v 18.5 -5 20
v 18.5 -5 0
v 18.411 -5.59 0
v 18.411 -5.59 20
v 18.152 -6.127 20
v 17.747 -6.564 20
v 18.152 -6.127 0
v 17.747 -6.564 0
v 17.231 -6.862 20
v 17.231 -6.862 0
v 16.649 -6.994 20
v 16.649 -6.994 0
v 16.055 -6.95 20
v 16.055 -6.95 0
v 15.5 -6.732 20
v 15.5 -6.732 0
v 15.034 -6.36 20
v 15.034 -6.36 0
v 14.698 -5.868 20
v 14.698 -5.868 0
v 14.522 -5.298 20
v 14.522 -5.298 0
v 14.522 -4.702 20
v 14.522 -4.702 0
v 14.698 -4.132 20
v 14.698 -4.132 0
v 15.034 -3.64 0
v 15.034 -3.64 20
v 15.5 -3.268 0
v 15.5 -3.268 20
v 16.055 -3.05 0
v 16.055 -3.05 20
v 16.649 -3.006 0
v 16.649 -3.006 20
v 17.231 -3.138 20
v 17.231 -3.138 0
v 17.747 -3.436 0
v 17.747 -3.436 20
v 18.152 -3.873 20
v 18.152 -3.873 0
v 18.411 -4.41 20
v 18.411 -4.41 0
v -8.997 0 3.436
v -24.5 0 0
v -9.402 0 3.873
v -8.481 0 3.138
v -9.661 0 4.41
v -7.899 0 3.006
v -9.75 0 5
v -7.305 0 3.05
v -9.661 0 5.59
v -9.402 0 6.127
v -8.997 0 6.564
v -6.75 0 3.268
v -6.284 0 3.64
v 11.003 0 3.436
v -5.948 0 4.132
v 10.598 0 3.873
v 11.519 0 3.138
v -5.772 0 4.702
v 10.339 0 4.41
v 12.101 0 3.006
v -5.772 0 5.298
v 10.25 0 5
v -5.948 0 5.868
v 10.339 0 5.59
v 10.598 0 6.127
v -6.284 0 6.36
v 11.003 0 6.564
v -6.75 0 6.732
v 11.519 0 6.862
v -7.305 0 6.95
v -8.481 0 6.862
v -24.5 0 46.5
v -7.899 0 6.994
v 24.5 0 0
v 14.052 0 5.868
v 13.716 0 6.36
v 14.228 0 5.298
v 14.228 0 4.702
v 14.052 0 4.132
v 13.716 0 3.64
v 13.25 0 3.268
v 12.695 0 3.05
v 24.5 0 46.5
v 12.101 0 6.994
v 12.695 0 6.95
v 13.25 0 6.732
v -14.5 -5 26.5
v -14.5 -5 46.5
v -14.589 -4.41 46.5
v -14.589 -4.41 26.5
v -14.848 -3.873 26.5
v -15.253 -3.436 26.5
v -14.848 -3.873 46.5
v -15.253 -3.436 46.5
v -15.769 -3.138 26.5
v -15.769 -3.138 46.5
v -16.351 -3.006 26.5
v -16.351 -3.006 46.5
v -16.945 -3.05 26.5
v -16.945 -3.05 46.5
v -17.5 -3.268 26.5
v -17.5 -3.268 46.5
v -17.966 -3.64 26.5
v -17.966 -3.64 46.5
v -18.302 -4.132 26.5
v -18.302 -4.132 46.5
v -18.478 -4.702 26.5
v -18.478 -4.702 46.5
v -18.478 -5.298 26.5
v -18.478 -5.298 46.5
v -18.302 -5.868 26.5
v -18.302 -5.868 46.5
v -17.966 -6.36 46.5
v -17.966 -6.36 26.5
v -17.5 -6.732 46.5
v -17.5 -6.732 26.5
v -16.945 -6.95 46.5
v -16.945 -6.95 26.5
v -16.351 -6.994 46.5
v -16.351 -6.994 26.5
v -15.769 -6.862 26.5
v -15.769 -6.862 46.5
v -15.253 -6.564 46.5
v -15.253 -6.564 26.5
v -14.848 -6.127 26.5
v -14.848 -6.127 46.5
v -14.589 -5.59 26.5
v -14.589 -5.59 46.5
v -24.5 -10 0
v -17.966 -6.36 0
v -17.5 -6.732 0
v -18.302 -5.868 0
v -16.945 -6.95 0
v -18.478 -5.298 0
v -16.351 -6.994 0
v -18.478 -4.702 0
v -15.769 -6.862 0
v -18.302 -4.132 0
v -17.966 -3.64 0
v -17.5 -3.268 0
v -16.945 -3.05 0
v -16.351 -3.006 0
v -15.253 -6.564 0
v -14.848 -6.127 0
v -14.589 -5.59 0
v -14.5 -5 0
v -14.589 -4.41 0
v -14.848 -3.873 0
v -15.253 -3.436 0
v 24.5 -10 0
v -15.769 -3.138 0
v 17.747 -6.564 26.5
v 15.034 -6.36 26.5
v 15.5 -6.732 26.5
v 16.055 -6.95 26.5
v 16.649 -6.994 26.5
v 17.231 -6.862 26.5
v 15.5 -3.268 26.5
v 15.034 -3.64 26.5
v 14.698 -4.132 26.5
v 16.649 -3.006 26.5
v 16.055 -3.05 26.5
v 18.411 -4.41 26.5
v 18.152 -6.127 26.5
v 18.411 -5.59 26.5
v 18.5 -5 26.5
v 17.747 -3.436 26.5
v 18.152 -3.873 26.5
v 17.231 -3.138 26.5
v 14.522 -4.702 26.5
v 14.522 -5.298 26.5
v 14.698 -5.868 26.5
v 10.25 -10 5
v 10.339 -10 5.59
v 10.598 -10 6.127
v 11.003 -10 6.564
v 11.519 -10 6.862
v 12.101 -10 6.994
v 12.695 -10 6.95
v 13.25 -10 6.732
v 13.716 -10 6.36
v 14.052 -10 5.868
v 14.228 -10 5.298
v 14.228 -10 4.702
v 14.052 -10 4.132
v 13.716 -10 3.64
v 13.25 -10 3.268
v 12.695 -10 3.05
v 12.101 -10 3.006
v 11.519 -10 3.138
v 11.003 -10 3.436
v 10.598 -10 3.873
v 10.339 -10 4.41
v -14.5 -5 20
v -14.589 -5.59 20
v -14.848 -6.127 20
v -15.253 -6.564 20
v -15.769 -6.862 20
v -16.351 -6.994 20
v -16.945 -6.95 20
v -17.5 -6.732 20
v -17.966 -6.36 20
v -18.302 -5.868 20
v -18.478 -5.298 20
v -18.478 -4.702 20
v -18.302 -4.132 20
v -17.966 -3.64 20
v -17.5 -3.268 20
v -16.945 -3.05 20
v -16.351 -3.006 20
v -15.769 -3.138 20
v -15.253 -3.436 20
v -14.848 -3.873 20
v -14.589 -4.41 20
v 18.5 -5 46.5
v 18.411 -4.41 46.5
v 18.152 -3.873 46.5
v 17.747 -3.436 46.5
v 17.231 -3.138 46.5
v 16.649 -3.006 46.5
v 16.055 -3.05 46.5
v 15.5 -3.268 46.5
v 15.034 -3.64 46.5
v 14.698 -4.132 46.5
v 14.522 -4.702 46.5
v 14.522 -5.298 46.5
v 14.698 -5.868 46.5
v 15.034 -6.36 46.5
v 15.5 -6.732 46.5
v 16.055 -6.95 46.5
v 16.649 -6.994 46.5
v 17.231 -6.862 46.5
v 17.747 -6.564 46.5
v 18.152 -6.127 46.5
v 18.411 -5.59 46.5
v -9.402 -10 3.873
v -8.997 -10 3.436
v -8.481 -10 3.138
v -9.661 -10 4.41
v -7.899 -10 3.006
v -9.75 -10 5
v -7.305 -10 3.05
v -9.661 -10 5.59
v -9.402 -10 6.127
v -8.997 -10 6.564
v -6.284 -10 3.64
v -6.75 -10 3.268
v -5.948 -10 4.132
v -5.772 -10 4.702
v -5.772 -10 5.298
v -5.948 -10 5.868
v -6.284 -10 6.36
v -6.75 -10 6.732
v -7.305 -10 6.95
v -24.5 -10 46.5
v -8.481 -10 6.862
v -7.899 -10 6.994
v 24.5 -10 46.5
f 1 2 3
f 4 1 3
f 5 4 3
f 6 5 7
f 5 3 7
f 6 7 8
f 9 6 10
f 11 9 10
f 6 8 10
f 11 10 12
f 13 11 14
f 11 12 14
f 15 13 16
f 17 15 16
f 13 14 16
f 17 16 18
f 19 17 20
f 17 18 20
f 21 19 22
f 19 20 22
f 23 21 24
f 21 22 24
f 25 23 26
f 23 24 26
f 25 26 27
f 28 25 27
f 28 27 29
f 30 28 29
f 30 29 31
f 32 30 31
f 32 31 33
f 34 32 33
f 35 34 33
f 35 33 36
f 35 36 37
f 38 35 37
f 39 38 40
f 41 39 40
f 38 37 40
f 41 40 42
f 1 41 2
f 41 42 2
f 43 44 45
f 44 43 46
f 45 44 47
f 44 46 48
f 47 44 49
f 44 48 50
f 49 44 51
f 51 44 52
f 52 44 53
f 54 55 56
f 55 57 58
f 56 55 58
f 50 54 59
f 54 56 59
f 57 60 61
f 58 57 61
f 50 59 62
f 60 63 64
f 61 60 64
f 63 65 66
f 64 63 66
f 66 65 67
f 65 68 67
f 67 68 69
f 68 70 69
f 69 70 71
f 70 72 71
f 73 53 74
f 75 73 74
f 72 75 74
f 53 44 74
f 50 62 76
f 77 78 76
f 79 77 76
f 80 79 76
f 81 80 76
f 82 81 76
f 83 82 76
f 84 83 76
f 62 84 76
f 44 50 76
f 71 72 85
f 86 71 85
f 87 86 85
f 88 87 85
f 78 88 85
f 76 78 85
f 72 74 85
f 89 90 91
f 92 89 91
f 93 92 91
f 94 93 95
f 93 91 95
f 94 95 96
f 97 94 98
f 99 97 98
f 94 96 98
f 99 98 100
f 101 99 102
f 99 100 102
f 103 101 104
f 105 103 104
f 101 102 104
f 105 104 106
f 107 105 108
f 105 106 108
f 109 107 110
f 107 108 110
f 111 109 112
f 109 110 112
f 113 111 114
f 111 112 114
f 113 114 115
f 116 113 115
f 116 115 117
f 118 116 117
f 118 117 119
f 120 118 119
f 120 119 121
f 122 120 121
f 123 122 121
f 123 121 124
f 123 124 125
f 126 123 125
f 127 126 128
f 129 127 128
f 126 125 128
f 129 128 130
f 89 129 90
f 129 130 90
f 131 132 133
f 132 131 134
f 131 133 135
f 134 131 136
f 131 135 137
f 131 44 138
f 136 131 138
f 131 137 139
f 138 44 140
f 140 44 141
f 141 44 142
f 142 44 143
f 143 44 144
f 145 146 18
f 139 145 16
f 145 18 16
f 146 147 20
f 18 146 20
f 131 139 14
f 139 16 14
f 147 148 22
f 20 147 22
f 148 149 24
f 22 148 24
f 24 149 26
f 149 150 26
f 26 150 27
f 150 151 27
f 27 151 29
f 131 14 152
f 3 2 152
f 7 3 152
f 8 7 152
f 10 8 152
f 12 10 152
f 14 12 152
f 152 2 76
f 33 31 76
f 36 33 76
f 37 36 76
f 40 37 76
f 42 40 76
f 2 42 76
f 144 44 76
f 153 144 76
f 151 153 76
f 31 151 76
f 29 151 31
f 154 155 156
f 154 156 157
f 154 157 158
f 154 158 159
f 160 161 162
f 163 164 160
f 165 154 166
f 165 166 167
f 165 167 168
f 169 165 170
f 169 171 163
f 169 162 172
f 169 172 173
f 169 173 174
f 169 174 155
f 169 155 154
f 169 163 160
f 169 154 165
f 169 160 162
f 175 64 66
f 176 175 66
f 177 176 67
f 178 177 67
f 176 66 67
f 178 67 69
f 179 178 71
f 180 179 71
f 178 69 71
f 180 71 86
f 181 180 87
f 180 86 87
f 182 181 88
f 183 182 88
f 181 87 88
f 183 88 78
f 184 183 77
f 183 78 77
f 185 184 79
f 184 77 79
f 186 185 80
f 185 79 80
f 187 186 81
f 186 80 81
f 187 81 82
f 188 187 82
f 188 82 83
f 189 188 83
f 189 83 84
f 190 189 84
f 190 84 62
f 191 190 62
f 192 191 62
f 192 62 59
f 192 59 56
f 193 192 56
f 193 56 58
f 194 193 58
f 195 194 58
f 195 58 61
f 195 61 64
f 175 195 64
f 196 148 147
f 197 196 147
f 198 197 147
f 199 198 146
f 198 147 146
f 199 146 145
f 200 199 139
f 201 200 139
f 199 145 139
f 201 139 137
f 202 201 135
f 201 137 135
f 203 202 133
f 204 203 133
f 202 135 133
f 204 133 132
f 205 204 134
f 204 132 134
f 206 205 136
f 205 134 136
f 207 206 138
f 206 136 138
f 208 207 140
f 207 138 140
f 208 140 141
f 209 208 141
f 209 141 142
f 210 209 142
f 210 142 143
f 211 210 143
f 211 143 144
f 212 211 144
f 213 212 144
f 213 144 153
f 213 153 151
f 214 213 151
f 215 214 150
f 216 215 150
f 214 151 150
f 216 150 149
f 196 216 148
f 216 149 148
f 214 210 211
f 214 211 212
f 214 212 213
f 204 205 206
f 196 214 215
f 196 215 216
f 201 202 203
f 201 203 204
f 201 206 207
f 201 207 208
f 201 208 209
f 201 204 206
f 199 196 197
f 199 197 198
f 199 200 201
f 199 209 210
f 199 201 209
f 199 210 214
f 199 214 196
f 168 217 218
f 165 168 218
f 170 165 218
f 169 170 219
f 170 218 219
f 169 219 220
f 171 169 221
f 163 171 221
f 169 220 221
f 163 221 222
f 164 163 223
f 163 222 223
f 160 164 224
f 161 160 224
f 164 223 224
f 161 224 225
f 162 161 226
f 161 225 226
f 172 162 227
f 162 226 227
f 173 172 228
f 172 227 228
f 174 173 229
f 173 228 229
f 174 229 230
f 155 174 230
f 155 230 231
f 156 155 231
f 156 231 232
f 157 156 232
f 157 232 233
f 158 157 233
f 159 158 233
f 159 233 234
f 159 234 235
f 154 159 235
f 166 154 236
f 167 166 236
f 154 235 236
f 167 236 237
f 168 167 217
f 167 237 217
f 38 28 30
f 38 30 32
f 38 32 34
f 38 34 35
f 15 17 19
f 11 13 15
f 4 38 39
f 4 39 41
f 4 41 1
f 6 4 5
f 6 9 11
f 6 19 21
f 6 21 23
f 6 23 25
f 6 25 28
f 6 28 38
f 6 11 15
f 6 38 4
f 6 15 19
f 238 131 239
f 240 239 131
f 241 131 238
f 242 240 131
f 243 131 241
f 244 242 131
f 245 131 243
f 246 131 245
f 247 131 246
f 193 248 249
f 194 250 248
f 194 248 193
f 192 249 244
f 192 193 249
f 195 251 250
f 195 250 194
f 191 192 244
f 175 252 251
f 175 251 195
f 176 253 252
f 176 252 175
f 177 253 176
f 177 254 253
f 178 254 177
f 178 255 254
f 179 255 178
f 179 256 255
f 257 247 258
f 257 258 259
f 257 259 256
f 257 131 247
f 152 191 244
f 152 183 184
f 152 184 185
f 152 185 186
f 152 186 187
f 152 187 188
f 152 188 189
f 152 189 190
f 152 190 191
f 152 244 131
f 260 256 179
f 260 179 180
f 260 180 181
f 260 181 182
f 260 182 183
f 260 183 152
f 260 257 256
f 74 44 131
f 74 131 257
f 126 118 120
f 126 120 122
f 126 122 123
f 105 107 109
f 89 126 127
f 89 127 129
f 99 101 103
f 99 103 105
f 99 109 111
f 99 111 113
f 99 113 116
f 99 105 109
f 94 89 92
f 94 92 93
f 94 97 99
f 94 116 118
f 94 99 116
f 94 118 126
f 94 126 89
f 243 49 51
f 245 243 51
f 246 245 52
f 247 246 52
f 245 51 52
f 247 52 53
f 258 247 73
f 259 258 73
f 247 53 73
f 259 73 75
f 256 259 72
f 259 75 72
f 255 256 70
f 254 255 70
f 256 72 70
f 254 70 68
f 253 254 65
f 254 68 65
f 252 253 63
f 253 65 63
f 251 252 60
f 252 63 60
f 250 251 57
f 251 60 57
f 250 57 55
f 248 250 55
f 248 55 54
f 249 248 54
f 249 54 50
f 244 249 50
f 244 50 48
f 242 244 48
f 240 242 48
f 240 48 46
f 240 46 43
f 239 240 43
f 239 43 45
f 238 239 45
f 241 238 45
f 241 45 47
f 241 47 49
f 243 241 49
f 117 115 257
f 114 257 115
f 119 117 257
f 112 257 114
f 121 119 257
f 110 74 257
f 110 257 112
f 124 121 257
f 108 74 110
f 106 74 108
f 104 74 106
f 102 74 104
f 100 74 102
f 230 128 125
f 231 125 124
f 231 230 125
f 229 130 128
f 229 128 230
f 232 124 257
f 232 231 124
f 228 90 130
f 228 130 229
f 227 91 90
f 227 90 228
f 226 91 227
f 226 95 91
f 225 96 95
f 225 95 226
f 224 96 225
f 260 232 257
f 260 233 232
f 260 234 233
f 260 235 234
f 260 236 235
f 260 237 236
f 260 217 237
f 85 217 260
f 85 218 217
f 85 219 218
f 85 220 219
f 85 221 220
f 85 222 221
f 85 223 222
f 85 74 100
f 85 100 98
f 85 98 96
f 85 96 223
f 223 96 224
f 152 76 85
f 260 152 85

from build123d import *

# Parameters (mm, degrees)
F0_W     = 49
F0_H     = 46.5
F1_DEPTH = 10
F2_R     = 2
F3_DEPTH = 10.001
F4_R     = 2
F5_DEPTH = 20
F6_R     = 2
F7_DEPTH = 20


with BuildPart() as f1:
    # F0 (on Front) → F1 (new body)
    with BuildSketch(Plane.XZ):
        with Locations((0, 23.25)):
            Rectangle(F0_W, F0_H)
    extrude(amount=F1_DEPTH)

    # F2 (on face) → F3 (cut, through all)
    with BuildSketch(Plane(origin=(0, 0, 0), x_dir=(-1, 0, 0), z_dir=(0, 1, 0))):
        with Locations((-12.25, 5)):
            Circle(F2_R)
        with Locations((7.75, 5)):
            Circle(F2_R)
    extrude(amount=-F3_DEPTH, mode=Mode.SUBTRACT)

    # F4 (on face) → F5 (cut)
    with BuildSketch(Plane.XY.offset(46.5)):
        with Locations((16.5, -5)):
            Circle(F4_R)
        with Locations((-16.5, -5)):
            Circle(F4_R)
    extrude(amount=-F5_DEPTH, mode=Mode.SUBTRACT)

    # F6 (on face) → F7 (cut)
    with BuildSketch(Plane(origin=(0, 0, 0), x_dir=(1, 0, 0), z_dir=(0, 0, -1))):
        with Locations((-16.5, 5)):
            Circle(F6_R)
        with Locations((16.5, 5)):
            Circle(F6_R)
    extrude(amount=-F7_DEPTH, mode=Mode.SUBTRACT)


solid = f1.part
